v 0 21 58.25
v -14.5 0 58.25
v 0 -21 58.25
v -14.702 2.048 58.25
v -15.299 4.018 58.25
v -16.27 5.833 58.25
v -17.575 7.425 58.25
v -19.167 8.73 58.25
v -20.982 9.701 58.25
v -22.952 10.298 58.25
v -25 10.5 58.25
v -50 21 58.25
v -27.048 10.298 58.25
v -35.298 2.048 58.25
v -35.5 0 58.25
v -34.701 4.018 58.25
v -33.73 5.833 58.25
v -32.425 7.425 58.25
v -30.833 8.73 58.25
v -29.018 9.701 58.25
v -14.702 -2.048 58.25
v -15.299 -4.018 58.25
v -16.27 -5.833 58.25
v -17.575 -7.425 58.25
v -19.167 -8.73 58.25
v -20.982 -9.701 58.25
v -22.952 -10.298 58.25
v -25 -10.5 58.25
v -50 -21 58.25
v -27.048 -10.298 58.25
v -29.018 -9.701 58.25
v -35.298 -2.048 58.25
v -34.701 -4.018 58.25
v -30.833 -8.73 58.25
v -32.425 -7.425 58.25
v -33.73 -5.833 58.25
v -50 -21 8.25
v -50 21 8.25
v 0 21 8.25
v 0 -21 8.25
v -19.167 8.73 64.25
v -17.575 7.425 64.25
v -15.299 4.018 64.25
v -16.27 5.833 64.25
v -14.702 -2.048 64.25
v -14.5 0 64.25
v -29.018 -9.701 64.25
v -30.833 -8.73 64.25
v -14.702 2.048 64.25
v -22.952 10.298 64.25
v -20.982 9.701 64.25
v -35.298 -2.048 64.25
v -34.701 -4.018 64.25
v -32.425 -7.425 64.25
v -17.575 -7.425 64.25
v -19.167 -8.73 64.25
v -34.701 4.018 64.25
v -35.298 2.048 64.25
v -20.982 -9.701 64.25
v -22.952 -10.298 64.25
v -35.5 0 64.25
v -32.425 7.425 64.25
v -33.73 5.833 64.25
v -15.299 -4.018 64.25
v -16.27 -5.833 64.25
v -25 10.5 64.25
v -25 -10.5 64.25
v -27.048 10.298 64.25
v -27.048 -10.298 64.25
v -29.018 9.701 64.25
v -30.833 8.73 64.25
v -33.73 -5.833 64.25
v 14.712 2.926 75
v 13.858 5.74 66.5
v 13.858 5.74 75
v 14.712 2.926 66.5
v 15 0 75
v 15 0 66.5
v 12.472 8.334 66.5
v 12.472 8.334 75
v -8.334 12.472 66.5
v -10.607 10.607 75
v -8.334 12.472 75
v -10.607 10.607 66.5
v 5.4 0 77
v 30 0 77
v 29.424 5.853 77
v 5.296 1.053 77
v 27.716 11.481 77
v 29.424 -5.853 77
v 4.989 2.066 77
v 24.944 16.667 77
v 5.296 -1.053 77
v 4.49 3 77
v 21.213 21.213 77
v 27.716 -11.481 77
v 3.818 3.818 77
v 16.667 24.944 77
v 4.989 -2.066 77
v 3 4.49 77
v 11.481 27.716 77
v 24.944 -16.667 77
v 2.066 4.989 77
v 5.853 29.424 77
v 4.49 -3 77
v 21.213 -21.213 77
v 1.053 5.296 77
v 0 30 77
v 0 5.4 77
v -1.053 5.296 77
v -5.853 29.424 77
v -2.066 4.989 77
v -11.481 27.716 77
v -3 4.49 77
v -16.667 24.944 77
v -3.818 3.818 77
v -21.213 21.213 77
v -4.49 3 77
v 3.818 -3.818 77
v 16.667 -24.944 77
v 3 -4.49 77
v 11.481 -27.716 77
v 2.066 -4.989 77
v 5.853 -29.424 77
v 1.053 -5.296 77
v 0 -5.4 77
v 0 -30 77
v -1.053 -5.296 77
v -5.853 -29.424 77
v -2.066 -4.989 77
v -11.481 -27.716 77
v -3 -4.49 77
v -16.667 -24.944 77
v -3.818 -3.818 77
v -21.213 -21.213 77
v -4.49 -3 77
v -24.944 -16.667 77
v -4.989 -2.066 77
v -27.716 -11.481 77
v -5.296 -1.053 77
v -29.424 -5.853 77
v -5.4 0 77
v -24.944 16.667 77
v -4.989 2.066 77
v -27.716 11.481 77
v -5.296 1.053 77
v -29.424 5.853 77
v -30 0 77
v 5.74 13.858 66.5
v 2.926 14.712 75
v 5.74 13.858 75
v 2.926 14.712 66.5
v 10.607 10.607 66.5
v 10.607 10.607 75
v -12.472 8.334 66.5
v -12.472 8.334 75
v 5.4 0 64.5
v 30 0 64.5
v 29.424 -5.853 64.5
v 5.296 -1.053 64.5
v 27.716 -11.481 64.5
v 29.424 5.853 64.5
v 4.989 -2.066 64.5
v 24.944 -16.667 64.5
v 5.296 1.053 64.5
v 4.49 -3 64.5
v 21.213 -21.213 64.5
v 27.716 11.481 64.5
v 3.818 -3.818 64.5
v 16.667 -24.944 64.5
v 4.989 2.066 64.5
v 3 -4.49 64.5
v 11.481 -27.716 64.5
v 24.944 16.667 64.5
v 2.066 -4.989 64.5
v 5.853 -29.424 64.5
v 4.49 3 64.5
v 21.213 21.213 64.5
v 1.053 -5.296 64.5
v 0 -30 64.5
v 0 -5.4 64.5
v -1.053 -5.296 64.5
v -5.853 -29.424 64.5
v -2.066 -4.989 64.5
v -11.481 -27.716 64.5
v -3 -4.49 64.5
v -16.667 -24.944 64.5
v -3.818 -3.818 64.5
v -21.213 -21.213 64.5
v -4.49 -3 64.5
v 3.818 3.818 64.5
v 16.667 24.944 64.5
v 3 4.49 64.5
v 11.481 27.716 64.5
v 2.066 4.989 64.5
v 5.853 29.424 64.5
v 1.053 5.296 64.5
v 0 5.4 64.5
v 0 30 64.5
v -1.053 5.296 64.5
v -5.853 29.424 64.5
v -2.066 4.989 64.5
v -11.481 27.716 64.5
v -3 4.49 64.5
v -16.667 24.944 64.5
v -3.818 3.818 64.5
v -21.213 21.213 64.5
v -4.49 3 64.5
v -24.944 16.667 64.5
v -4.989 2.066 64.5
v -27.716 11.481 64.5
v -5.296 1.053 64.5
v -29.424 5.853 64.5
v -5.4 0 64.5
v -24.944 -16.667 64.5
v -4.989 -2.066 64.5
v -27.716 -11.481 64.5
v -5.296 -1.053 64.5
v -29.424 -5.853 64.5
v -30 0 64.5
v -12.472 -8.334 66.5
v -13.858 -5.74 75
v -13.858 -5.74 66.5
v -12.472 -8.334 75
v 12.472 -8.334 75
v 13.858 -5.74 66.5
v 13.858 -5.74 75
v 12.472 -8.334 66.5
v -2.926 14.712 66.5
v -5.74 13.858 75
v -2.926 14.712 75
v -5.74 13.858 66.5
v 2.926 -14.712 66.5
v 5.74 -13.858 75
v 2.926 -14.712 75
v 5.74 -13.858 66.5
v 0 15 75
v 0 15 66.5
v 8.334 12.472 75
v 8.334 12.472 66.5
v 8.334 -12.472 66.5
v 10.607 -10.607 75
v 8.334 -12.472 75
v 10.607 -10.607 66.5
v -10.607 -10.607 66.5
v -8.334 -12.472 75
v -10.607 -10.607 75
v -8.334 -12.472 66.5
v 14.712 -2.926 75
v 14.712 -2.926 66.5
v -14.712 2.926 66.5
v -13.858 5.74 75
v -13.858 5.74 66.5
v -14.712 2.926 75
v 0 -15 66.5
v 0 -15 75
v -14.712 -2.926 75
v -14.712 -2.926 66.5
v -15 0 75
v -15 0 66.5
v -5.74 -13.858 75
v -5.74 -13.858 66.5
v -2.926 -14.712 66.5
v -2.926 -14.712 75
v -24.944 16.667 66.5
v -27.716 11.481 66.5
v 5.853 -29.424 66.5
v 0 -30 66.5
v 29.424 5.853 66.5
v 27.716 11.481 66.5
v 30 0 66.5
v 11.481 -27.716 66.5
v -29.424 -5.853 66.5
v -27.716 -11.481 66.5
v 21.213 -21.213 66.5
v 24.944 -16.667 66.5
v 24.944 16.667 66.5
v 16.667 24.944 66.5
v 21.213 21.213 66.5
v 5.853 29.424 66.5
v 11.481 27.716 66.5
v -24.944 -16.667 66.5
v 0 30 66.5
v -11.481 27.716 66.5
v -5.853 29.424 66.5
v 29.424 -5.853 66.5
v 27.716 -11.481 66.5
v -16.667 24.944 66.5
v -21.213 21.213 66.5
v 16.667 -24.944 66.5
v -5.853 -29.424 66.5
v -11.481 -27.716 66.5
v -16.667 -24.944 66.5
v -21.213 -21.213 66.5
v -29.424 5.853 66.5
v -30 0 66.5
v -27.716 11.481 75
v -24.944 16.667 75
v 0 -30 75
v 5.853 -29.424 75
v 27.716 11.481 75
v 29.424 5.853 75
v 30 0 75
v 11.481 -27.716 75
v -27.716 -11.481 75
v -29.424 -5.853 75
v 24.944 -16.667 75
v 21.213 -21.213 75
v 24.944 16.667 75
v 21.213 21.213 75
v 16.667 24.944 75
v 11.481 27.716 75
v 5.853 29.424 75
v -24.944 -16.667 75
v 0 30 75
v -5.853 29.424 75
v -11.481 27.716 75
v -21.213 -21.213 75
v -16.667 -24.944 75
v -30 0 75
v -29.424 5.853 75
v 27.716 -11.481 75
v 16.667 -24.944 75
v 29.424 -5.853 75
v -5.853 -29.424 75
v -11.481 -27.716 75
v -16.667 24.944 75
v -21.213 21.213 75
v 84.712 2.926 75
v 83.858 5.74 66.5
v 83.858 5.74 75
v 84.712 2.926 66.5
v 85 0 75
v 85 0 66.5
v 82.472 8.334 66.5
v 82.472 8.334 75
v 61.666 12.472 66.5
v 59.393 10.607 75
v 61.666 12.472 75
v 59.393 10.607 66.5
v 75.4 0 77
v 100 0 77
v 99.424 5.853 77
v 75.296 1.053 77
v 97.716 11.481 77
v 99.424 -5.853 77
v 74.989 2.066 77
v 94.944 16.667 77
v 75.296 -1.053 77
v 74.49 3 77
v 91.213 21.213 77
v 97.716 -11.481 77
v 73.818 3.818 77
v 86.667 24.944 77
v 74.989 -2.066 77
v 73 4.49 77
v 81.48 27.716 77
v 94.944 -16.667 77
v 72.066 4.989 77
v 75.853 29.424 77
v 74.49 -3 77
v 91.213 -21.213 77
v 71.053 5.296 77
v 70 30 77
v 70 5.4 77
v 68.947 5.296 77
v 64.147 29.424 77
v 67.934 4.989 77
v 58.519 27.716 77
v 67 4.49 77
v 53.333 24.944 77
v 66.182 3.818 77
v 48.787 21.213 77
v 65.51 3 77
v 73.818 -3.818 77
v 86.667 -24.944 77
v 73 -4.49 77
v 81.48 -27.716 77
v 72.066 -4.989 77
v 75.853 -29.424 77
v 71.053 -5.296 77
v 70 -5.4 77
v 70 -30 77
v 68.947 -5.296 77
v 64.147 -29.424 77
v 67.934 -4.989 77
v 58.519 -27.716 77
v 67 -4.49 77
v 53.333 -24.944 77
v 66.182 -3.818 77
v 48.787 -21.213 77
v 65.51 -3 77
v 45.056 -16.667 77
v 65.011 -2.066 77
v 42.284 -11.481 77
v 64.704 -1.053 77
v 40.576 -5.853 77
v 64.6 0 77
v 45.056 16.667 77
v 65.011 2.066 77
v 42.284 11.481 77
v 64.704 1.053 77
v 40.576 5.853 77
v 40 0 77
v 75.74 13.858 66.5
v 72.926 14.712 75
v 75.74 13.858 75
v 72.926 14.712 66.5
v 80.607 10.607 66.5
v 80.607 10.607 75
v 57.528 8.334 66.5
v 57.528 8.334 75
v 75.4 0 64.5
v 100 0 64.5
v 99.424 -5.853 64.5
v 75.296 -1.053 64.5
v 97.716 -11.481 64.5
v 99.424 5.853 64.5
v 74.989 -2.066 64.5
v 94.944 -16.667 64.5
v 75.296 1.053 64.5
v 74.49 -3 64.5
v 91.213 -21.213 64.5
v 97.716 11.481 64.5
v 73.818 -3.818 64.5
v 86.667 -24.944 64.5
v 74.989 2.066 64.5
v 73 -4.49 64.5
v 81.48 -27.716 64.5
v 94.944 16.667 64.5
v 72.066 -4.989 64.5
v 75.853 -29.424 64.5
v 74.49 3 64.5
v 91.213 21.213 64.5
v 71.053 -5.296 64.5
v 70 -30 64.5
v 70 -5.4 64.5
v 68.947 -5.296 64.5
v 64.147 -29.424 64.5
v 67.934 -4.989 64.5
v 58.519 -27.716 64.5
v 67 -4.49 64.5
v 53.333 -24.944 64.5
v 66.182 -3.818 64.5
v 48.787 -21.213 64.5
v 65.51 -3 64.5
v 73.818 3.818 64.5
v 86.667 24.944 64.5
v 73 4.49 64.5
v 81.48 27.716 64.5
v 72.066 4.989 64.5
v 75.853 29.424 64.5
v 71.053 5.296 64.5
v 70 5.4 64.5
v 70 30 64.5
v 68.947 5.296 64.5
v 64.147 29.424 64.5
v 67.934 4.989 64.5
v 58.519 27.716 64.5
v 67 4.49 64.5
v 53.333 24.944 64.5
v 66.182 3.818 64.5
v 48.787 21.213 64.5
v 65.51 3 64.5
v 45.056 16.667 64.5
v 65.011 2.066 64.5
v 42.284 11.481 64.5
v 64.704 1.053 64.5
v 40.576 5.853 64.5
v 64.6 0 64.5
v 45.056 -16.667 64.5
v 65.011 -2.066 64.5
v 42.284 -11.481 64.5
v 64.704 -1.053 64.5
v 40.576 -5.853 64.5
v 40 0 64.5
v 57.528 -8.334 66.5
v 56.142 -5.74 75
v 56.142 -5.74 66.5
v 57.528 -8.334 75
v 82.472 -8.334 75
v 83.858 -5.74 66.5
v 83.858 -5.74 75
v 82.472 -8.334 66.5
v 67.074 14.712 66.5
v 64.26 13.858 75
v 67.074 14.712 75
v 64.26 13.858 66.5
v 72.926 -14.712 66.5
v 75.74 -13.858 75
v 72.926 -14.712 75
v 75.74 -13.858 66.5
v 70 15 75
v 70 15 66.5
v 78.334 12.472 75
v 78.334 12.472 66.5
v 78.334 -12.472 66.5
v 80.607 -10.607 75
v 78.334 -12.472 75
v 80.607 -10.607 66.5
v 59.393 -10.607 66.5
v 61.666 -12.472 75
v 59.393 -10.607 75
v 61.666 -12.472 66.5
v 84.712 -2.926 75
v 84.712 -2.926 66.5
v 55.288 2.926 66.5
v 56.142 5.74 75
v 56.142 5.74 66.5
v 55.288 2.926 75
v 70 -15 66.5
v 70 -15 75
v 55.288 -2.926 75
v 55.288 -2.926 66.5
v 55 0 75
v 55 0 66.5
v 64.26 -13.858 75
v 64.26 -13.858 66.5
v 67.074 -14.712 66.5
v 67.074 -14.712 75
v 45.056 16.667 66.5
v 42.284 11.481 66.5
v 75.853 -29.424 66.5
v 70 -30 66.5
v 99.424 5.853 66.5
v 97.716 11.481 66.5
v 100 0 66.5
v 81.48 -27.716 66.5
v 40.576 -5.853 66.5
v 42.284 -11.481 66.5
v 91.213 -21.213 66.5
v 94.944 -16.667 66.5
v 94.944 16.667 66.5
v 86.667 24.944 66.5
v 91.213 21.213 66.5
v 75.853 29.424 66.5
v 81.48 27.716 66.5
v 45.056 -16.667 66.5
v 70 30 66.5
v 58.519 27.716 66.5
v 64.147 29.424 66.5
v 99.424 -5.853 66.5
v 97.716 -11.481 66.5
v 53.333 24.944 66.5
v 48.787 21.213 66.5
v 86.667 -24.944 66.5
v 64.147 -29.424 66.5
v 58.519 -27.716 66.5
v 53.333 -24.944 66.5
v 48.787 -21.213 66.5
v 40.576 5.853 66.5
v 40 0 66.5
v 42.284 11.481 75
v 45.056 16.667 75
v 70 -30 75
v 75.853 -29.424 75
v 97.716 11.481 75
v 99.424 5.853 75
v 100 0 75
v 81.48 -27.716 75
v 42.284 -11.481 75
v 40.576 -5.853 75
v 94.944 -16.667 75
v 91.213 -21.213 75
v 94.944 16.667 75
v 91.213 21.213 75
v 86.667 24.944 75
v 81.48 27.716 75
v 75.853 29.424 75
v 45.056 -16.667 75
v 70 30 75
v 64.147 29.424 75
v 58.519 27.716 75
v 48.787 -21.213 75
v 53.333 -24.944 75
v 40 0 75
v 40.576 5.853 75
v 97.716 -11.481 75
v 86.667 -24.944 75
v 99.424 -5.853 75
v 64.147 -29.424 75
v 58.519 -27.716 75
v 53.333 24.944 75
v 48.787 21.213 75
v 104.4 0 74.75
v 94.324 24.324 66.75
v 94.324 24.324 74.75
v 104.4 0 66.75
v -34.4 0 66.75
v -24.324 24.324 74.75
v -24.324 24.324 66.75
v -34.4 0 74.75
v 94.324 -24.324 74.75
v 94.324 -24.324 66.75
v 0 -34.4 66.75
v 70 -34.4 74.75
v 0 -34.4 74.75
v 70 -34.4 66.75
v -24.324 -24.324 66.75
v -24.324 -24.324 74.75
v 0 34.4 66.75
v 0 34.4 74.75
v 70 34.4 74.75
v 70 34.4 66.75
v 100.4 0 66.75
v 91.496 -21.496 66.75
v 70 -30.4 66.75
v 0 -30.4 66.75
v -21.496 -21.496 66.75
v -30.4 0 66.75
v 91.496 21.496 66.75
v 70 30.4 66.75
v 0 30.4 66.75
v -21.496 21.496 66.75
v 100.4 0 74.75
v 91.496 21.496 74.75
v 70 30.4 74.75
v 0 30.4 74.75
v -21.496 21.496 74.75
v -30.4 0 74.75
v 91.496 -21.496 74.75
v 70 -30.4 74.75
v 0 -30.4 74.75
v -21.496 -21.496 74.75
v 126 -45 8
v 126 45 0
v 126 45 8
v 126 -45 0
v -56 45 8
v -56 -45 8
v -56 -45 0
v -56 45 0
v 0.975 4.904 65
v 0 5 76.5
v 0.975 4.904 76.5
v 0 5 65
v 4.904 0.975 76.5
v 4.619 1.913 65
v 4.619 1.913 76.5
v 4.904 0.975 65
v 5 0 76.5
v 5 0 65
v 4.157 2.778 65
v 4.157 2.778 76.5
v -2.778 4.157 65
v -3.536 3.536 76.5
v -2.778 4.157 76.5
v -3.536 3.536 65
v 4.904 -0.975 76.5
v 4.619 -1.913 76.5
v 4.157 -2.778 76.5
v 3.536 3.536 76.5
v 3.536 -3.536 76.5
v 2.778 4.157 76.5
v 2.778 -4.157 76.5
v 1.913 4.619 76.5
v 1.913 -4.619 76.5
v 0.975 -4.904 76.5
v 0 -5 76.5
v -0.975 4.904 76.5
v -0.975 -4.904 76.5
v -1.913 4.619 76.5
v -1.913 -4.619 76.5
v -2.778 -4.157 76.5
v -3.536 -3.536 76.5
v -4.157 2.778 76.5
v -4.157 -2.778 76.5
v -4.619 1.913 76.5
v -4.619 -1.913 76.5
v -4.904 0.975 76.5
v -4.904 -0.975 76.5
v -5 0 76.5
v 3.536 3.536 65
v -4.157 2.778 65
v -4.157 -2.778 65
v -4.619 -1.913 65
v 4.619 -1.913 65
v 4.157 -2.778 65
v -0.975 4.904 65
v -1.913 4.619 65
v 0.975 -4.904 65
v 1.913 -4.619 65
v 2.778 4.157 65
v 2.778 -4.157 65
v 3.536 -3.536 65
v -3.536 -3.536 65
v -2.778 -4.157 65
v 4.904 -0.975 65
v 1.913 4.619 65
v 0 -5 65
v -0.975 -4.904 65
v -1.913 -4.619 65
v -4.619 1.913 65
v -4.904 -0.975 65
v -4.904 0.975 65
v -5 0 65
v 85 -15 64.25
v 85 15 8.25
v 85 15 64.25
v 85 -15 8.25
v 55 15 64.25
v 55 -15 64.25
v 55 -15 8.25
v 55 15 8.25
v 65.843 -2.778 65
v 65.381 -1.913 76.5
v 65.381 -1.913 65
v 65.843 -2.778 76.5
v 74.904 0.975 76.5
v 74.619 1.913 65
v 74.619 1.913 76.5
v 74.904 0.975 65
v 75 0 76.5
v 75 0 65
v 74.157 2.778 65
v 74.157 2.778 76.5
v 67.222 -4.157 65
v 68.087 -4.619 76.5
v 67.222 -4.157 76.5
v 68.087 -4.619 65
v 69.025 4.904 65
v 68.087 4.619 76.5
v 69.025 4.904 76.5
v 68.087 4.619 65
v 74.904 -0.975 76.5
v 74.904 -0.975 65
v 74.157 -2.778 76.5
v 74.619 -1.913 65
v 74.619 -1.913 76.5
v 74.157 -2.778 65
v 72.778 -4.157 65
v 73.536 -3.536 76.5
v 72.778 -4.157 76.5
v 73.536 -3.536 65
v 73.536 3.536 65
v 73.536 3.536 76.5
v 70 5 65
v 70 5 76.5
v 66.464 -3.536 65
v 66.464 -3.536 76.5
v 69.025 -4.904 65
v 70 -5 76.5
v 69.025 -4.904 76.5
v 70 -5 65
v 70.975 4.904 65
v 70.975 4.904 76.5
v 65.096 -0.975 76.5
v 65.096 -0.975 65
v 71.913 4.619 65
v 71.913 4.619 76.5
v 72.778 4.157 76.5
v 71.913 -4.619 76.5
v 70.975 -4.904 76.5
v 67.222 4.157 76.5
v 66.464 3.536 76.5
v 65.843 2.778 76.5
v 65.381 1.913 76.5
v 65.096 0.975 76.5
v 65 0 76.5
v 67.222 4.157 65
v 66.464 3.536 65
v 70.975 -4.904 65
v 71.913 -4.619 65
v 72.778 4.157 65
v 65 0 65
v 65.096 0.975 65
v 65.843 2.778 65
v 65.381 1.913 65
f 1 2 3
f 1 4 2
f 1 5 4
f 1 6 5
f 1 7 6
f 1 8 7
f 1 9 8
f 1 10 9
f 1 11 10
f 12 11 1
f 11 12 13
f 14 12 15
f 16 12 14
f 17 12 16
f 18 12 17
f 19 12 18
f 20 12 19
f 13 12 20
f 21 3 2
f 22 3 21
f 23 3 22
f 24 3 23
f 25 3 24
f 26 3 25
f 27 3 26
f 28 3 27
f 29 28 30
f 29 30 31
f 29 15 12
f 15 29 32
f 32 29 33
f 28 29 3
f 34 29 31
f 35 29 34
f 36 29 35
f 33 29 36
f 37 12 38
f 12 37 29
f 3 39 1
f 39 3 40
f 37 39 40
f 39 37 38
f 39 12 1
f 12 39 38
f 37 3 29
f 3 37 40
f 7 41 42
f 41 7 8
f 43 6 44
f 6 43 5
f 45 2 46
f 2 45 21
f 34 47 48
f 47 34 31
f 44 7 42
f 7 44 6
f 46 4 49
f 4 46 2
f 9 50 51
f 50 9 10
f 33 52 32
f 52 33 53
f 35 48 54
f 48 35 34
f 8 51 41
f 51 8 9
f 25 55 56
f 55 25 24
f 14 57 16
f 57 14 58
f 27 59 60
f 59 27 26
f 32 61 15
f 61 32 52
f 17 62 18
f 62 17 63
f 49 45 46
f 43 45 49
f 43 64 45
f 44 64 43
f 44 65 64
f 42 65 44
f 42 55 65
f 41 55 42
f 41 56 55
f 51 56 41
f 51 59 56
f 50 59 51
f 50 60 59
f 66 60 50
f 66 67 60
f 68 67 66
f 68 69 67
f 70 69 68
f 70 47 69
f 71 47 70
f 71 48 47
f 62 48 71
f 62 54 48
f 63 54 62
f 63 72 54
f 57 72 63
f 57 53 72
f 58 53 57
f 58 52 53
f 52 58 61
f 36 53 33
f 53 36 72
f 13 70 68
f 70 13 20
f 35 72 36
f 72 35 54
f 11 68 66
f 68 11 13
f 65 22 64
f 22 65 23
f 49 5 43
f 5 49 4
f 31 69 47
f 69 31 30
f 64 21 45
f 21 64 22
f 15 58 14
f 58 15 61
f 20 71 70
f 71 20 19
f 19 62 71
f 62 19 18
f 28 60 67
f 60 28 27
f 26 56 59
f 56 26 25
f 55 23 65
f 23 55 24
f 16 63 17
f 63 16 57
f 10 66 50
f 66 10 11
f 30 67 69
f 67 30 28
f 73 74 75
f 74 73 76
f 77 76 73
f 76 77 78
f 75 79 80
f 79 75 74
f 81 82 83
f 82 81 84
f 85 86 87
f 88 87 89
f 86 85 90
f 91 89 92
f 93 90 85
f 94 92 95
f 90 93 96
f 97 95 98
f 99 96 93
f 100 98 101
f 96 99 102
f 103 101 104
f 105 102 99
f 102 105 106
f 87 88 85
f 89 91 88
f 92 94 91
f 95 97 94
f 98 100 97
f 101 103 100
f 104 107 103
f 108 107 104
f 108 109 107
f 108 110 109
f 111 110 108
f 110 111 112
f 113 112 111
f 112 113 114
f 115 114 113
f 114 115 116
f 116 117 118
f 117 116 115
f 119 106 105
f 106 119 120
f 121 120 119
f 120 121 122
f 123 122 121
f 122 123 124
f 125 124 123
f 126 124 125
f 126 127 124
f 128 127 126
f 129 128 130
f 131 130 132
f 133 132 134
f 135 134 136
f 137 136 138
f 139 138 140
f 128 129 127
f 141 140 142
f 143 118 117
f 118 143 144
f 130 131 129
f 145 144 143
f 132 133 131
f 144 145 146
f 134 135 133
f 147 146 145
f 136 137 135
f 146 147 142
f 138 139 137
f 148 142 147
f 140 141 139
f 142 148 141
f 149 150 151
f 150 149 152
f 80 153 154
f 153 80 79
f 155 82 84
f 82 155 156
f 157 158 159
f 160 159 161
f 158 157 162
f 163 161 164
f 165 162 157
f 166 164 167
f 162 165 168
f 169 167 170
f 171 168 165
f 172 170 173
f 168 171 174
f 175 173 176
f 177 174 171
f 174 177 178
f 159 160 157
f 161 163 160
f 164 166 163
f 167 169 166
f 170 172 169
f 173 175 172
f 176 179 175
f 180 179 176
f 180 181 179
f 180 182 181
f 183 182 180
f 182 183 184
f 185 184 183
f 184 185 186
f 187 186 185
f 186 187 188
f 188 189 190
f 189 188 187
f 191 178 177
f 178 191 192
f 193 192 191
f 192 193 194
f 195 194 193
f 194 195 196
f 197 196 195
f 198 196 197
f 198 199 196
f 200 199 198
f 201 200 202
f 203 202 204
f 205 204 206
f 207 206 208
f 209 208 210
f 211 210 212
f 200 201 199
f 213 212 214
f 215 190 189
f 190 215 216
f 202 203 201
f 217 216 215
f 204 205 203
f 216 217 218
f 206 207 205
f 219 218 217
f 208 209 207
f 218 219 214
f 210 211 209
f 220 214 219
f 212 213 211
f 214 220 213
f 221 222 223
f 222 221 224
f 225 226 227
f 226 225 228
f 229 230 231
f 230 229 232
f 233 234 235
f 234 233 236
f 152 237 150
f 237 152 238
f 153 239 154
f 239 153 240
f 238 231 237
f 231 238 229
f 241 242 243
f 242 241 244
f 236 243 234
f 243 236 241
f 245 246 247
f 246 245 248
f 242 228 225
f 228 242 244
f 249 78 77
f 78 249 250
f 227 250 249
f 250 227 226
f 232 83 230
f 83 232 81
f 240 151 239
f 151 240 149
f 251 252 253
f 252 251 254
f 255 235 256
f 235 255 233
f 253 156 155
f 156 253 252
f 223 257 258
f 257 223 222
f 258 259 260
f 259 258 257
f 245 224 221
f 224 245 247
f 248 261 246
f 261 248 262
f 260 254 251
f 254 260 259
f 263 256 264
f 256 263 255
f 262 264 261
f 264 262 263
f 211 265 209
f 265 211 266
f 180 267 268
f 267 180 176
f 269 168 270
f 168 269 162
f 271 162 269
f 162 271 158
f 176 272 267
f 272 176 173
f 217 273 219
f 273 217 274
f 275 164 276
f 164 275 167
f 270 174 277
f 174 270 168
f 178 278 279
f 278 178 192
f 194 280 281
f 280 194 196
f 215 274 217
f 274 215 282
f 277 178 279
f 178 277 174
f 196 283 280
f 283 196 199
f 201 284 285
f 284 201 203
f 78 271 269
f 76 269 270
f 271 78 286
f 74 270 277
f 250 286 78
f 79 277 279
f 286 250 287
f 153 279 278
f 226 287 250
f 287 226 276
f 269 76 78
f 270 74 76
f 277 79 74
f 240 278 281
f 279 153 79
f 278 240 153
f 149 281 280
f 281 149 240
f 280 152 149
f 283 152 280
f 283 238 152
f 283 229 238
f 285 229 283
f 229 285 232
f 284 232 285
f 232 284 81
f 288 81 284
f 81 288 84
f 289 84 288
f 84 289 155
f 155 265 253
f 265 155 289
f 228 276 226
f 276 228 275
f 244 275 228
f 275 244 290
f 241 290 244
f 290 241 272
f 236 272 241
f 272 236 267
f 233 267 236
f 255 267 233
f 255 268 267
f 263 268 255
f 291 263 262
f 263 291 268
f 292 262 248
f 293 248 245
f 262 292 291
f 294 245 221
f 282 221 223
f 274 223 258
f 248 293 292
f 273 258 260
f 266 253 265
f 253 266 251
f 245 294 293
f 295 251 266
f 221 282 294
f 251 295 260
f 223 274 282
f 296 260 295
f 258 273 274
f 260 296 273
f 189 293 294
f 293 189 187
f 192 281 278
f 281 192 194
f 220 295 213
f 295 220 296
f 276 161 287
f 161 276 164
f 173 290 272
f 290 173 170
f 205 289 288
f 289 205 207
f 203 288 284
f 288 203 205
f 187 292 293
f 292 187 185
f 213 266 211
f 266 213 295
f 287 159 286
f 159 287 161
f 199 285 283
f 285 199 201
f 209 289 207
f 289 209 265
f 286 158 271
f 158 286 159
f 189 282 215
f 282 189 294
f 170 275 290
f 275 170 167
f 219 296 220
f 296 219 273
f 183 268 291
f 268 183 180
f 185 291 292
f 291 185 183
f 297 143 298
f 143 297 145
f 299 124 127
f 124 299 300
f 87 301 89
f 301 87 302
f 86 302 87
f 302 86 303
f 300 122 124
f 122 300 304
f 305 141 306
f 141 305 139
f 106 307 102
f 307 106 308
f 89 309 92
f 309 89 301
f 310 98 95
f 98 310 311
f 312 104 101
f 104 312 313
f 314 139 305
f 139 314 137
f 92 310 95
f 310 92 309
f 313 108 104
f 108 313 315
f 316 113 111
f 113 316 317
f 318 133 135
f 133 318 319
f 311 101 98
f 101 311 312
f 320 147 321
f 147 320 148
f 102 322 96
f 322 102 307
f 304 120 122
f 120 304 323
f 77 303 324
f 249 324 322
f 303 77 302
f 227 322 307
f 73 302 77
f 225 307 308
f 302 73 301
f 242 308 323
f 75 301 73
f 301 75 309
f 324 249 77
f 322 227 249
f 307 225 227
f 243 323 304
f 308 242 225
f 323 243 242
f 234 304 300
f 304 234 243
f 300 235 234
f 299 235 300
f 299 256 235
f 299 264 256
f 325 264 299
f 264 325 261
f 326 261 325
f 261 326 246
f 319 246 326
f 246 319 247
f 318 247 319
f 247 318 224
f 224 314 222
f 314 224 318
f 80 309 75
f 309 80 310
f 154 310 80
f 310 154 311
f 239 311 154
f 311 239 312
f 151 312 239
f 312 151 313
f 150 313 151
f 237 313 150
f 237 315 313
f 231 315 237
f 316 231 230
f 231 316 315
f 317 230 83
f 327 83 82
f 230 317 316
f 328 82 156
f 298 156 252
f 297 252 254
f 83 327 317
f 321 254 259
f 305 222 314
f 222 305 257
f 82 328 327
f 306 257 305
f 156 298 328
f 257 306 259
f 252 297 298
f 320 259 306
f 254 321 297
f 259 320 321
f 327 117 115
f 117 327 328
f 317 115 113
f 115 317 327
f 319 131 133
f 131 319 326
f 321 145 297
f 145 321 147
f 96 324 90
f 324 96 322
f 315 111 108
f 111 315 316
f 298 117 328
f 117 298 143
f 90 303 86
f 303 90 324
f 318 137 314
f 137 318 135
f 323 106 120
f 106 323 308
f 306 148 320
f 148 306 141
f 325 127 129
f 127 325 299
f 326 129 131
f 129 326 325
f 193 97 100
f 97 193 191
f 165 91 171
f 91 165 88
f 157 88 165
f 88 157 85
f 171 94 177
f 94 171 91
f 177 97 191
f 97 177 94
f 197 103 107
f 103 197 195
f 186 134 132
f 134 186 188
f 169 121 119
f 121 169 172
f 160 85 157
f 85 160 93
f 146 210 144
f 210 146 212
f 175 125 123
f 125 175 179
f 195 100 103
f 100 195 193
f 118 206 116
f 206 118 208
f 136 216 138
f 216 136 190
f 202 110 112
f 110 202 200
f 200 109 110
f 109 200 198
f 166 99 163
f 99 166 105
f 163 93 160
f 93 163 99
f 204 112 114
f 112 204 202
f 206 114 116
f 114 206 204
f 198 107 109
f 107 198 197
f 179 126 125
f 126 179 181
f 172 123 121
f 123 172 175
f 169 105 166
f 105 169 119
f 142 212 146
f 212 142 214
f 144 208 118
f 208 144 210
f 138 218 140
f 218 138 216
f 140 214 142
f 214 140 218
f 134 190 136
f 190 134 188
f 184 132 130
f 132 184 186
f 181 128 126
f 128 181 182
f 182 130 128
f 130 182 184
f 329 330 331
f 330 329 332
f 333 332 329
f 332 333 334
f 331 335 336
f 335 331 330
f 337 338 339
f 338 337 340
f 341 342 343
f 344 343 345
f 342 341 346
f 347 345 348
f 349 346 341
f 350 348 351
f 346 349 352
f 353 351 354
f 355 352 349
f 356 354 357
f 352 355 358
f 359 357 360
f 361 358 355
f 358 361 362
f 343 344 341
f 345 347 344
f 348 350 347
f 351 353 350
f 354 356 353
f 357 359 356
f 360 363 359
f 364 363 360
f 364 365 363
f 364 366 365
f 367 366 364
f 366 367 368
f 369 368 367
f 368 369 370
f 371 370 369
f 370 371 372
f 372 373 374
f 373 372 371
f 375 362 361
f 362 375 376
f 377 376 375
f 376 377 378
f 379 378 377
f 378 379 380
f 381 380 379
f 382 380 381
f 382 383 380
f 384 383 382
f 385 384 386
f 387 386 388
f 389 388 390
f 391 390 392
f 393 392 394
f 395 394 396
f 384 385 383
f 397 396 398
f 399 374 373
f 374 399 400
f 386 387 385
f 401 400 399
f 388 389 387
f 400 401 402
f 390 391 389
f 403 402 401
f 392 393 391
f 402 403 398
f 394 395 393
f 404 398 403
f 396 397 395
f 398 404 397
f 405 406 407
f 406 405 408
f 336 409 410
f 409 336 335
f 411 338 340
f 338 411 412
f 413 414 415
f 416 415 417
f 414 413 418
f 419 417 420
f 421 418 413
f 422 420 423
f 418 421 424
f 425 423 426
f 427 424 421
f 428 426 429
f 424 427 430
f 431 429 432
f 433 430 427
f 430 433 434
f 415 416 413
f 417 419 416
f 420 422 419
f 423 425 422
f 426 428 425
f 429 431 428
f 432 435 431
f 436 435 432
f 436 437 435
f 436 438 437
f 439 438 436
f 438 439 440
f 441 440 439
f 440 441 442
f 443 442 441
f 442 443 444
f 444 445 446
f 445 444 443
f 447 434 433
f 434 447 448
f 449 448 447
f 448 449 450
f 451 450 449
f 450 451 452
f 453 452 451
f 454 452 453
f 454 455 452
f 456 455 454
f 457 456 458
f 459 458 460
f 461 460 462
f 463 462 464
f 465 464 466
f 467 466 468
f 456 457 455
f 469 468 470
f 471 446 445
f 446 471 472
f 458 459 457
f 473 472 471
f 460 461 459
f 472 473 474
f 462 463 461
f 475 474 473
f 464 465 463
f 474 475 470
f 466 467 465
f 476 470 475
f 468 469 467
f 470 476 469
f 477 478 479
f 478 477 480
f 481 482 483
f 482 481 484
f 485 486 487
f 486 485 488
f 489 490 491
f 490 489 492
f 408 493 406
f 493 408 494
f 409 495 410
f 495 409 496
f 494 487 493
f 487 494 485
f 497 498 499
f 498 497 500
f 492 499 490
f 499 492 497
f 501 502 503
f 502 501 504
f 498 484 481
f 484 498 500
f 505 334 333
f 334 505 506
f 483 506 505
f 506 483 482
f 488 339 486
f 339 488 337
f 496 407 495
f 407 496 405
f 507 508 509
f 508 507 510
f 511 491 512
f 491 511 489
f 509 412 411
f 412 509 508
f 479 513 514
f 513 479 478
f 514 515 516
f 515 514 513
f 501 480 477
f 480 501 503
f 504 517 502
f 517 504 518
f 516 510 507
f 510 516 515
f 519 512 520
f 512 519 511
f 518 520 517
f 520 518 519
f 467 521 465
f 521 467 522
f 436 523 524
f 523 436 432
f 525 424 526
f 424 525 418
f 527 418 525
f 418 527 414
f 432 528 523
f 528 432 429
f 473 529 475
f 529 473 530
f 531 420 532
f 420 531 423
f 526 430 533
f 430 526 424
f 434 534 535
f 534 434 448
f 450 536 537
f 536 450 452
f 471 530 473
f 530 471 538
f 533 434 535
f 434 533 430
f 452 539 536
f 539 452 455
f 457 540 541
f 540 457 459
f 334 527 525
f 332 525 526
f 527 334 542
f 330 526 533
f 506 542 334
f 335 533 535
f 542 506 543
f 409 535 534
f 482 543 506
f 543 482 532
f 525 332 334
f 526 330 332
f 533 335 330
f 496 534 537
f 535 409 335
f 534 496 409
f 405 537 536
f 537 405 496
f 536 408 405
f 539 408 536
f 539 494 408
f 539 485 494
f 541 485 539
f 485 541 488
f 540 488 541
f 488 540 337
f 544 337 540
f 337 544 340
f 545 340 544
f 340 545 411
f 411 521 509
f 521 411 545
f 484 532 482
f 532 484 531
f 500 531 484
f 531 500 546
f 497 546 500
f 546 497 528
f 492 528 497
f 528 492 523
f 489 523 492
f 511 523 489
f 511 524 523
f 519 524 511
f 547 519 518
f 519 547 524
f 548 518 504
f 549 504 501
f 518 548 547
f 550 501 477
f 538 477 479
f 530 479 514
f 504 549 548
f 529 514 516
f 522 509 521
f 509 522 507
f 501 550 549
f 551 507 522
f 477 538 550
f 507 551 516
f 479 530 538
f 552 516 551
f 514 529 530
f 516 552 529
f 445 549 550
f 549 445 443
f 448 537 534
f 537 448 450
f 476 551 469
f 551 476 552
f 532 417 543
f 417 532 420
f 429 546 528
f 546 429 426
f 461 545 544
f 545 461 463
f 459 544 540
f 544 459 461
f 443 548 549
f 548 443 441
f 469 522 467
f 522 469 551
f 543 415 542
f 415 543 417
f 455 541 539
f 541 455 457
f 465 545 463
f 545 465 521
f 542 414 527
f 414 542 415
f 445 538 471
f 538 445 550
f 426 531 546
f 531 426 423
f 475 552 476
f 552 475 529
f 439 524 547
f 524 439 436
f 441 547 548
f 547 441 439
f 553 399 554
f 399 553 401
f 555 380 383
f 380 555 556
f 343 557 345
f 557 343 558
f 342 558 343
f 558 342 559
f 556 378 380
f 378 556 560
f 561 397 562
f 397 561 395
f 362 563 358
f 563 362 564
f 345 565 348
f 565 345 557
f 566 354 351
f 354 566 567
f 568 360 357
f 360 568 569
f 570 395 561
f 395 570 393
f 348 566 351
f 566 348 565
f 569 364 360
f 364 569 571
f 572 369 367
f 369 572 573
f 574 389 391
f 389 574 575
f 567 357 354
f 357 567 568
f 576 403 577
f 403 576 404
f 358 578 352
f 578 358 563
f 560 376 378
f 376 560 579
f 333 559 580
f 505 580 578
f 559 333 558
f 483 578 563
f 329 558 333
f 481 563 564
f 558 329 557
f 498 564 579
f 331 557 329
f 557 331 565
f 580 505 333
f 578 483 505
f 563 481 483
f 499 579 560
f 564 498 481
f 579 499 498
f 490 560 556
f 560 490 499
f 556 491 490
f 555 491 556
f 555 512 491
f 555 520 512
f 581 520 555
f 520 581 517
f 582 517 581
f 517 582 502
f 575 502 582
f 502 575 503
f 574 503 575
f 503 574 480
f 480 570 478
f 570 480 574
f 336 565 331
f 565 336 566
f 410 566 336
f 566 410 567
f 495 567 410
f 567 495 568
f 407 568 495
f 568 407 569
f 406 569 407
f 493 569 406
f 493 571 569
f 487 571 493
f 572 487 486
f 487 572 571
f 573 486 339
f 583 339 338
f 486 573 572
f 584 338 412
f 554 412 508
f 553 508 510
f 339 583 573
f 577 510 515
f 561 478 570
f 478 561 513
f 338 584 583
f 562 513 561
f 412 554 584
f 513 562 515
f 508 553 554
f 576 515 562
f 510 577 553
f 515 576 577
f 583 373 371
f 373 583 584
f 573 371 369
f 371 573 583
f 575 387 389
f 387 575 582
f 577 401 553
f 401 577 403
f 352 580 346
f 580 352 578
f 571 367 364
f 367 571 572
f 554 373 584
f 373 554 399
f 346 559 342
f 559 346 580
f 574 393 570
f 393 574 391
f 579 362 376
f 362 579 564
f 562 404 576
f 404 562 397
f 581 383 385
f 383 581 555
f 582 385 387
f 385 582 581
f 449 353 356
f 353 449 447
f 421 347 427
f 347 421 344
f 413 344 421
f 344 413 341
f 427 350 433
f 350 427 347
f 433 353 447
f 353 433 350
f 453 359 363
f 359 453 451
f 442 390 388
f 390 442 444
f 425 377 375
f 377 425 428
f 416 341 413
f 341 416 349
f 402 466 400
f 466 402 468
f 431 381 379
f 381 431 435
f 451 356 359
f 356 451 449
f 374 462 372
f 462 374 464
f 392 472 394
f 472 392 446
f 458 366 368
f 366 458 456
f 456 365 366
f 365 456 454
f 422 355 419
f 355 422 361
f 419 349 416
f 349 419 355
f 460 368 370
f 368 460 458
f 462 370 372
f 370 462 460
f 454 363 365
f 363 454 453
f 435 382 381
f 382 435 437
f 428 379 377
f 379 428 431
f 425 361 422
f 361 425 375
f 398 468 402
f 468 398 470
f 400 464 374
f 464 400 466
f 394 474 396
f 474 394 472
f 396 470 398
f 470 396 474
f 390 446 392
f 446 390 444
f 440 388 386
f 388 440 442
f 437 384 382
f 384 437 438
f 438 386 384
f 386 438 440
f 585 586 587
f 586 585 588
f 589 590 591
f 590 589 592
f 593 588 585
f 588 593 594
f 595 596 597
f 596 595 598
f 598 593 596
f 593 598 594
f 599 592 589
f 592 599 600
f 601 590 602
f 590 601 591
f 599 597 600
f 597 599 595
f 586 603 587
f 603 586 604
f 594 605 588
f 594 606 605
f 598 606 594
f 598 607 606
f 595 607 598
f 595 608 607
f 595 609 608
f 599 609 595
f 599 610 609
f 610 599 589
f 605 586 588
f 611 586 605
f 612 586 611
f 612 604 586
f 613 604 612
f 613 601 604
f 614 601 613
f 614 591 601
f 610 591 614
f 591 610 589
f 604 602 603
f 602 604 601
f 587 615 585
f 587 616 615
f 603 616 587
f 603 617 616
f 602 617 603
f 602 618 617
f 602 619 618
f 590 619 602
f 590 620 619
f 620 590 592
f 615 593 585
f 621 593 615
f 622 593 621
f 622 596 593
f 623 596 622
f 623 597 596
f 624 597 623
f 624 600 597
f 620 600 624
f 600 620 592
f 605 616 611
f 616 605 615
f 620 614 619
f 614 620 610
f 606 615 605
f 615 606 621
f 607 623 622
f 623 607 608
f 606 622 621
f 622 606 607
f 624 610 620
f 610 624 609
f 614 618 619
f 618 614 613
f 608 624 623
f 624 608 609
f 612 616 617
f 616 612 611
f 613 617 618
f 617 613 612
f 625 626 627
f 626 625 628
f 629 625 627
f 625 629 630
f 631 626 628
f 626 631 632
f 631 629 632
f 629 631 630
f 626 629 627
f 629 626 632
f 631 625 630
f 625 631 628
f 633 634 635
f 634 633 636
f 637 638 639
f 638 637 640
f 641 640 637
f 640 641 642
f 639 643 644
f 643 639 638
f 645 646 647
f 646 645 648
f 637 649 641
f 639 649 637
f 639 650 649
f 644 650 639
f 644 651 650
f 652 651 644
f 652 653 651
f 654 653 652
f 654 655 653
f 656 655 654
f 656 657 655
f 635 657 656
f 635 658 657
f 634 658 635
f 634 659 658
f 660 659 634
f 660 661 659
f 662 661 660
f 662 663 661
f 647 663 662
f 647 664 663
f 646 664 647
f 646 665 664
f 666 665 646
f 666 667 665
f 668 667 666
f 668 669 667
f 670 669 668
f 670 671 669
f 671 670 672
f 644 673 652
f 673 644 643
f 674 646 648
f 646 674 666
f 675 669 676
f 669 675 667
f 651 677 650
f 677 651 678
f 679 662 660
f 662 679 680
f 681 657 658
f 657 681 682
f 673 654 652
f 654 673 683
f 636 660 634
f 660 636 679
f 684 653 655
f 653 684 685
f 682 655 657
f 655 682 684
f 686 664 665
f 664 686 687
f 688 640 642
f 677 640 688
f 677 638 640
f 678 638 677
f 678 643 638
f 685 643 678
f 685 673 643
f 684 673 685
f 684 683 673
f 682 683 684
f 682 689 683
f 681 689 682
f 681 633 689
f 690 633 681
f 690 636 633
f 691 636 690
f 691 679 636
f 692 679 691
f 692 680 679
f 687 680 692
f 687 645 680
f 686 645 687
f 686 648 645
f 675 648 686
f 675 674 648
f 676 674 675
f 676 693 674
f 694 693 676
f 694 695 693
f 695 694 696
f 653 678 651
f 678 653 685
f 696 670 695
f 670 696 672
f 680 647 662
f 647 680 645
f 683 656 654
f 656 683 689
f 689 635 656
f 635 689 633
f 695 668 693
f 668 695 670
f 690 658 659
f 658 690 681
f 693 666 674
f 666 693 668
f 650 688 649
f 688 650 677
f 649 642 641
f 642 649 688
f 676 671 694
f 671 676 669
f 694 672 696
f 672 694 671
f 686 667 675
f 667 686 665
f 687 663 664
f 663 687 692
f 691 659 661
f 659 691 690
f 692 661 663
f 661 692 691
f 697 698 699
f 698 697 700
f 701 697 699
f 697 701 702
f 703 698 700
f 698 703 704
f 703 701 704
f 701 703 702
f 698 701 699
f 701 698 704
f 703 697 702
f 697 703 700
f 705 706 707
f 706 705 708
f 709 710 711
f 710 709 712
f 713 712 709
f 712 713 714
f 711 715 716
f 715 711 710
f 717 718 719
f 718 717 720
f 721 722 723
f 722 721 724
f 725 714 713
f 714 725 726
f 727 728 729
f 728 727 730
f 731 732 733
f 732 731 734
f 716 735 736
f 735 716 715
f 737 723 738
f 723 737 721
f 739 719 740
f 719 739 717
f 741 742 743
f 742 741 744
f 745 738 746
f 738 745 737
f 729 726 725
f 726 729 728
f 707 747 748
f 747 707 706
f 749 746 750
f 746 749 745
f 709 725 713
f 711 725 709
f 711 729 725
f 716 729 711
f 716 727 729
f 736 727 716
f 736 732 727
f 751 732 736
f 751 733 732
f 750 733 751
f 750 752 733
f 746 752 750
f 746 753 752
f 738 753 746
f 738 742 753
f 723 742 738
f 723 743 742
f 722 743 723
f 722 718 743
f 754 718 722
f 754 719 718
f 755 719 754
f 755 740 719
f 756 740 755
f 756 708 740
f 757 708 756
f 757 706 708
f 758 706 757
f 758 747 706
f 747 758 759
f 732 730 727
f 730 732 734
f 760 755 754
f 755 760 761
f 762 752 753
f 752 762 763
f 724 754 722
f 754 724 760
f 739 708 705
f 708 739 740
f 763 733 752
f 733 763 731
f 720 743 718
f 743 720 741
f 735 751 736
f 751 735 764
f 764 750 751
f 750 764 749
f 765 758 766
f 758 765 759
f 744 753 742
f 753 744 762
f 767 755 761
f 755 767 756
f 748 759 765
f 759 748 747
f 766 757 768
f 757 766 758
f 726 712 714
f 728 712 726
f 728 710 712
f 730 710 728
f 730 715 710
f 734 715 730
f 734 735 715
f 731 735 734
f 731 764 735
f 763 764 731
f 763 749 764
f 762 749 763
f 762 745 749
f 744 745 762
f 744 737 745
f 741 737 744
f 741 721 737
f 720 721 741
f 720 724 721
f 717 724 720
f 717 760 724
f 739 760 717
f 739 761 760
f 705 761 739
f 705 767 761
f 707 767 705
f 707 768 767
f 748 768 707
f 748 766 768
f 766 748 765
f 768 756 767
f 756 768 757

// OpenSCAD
$fn = 32;

// ------------------------------------------------------------------------
// Motor belt drive: span 70 mm, pulleys d60, belt 8 mm wide
// Every part is its own module, assembly() places every instance.
// ------------------------------------------------------------------------

// --- part 1 ---
module base_plate() {
  difference() {
    translate([-91, -45, 0]) cube([182, 90, 8]);
  }
}

// --- part 2 ---
module motor() {
  union() {
    translate([-25, -21, 0]) cube([50, 42, 50]);
    translate([28, 0, 25]) rotate([0, 90, 0]) cylinder(h = 6, d = 21, center = true);
  }
}

// --- part 3 ---
module drive_shaft() {
  translate([0, 0, -5.75]) cylinder(h = 11.5, d = 10);
}

// --- part 4 ---
module pulley_drive() {
  difference() {
    union() {
      cylinder(h = 12.5, d = 30);
      cylinder(h = 2, d = 60);
      translate([0, 0, 10.5]) cylinder(h = 2, d = 60);
    }
    translate([0, 0, -1]) cylinder(h = 14.5, d = 10.8);
  }
}

// --- part 5 ---
module idler_post() {
  translate([-15, -15, 0]) cube([30, 30, 56]);
}

// --- part 6 ---
module driven_shaft() {
  translate([0, 0, -5.75]) cylinder(h = 11.5, d = 10);
}

// --- part 7 ---
module pulley_driven() {
  difference() {
    union() {
      cylinder(h = 12.5, d = 30);
      cylinder(h = 2, d = 60);
      translate([0, 0, 10.5]) cylinder(h = 2, d = 60);
    }
    translate([0, 0, -1]) cylinder(h = 14.5, d = 10.8);
  }
}

// --- part 8 ---
module drive_belt() {
  difference() {
    linear_extrude(height = 8) polygon(points = concat([for (a = [90 : 45 : 270]) [34.4 * cos(a), 34.4 * sin(a)]], [for (a = [270 : 45 : 450]) [70 + 34.4 * cos(a), 34.4 * sin(a)]]));
    translate([0, 0, -1]) linear_extrude(height = 10) polygon(points = concat([for (a = [90 : 45 : 270]) [30.4 * cos(a), 30.4 * sin(a)]], [for (a = [270 : 45 : 450]) [70 + 30.4 * cos(a), 30.4 * sin(a)]]));
  }
}

// --- assembly ---
module assembly() {
  color([0.80, 0.24, 0.20]) translate([35, 0, 0]) rotate([0, 0, 0]) base_plate();
  color([0.20, 0.45, 0.75]) translate([0, 0, 33.25]) rotate([0, 270, 0]) motor();
  color([0.25, 0.62, 0.32]) translate([0, 0, 70.75]) rotate([0, 0, 0]) drive_shaft();
  color([0.92, 0.70, 0.18]) translate([0, 0, 64.5]) rotate([0, 0, 0]) pulley_drive();
  color([0.58, 0.35, 0.70]) translate([70, 0, 8.25]) rotate([0, 0, 0]) idler_post();
  color([0.16, 0.66, 0.66]) translate([70, 0, 70.75]) rotate([0, 0, 0]) driven_shaft();
  color([0.85, 0.48, 0.18]) translate([70, 0, 64.5]) rotate([0, 0, 0]) pulley_driven();
  color([0.55, 0.60, 0.65]) translate([0, 0, 66.75]) rotate([0, 0, 0]) drive_belt();
}

assembly();
